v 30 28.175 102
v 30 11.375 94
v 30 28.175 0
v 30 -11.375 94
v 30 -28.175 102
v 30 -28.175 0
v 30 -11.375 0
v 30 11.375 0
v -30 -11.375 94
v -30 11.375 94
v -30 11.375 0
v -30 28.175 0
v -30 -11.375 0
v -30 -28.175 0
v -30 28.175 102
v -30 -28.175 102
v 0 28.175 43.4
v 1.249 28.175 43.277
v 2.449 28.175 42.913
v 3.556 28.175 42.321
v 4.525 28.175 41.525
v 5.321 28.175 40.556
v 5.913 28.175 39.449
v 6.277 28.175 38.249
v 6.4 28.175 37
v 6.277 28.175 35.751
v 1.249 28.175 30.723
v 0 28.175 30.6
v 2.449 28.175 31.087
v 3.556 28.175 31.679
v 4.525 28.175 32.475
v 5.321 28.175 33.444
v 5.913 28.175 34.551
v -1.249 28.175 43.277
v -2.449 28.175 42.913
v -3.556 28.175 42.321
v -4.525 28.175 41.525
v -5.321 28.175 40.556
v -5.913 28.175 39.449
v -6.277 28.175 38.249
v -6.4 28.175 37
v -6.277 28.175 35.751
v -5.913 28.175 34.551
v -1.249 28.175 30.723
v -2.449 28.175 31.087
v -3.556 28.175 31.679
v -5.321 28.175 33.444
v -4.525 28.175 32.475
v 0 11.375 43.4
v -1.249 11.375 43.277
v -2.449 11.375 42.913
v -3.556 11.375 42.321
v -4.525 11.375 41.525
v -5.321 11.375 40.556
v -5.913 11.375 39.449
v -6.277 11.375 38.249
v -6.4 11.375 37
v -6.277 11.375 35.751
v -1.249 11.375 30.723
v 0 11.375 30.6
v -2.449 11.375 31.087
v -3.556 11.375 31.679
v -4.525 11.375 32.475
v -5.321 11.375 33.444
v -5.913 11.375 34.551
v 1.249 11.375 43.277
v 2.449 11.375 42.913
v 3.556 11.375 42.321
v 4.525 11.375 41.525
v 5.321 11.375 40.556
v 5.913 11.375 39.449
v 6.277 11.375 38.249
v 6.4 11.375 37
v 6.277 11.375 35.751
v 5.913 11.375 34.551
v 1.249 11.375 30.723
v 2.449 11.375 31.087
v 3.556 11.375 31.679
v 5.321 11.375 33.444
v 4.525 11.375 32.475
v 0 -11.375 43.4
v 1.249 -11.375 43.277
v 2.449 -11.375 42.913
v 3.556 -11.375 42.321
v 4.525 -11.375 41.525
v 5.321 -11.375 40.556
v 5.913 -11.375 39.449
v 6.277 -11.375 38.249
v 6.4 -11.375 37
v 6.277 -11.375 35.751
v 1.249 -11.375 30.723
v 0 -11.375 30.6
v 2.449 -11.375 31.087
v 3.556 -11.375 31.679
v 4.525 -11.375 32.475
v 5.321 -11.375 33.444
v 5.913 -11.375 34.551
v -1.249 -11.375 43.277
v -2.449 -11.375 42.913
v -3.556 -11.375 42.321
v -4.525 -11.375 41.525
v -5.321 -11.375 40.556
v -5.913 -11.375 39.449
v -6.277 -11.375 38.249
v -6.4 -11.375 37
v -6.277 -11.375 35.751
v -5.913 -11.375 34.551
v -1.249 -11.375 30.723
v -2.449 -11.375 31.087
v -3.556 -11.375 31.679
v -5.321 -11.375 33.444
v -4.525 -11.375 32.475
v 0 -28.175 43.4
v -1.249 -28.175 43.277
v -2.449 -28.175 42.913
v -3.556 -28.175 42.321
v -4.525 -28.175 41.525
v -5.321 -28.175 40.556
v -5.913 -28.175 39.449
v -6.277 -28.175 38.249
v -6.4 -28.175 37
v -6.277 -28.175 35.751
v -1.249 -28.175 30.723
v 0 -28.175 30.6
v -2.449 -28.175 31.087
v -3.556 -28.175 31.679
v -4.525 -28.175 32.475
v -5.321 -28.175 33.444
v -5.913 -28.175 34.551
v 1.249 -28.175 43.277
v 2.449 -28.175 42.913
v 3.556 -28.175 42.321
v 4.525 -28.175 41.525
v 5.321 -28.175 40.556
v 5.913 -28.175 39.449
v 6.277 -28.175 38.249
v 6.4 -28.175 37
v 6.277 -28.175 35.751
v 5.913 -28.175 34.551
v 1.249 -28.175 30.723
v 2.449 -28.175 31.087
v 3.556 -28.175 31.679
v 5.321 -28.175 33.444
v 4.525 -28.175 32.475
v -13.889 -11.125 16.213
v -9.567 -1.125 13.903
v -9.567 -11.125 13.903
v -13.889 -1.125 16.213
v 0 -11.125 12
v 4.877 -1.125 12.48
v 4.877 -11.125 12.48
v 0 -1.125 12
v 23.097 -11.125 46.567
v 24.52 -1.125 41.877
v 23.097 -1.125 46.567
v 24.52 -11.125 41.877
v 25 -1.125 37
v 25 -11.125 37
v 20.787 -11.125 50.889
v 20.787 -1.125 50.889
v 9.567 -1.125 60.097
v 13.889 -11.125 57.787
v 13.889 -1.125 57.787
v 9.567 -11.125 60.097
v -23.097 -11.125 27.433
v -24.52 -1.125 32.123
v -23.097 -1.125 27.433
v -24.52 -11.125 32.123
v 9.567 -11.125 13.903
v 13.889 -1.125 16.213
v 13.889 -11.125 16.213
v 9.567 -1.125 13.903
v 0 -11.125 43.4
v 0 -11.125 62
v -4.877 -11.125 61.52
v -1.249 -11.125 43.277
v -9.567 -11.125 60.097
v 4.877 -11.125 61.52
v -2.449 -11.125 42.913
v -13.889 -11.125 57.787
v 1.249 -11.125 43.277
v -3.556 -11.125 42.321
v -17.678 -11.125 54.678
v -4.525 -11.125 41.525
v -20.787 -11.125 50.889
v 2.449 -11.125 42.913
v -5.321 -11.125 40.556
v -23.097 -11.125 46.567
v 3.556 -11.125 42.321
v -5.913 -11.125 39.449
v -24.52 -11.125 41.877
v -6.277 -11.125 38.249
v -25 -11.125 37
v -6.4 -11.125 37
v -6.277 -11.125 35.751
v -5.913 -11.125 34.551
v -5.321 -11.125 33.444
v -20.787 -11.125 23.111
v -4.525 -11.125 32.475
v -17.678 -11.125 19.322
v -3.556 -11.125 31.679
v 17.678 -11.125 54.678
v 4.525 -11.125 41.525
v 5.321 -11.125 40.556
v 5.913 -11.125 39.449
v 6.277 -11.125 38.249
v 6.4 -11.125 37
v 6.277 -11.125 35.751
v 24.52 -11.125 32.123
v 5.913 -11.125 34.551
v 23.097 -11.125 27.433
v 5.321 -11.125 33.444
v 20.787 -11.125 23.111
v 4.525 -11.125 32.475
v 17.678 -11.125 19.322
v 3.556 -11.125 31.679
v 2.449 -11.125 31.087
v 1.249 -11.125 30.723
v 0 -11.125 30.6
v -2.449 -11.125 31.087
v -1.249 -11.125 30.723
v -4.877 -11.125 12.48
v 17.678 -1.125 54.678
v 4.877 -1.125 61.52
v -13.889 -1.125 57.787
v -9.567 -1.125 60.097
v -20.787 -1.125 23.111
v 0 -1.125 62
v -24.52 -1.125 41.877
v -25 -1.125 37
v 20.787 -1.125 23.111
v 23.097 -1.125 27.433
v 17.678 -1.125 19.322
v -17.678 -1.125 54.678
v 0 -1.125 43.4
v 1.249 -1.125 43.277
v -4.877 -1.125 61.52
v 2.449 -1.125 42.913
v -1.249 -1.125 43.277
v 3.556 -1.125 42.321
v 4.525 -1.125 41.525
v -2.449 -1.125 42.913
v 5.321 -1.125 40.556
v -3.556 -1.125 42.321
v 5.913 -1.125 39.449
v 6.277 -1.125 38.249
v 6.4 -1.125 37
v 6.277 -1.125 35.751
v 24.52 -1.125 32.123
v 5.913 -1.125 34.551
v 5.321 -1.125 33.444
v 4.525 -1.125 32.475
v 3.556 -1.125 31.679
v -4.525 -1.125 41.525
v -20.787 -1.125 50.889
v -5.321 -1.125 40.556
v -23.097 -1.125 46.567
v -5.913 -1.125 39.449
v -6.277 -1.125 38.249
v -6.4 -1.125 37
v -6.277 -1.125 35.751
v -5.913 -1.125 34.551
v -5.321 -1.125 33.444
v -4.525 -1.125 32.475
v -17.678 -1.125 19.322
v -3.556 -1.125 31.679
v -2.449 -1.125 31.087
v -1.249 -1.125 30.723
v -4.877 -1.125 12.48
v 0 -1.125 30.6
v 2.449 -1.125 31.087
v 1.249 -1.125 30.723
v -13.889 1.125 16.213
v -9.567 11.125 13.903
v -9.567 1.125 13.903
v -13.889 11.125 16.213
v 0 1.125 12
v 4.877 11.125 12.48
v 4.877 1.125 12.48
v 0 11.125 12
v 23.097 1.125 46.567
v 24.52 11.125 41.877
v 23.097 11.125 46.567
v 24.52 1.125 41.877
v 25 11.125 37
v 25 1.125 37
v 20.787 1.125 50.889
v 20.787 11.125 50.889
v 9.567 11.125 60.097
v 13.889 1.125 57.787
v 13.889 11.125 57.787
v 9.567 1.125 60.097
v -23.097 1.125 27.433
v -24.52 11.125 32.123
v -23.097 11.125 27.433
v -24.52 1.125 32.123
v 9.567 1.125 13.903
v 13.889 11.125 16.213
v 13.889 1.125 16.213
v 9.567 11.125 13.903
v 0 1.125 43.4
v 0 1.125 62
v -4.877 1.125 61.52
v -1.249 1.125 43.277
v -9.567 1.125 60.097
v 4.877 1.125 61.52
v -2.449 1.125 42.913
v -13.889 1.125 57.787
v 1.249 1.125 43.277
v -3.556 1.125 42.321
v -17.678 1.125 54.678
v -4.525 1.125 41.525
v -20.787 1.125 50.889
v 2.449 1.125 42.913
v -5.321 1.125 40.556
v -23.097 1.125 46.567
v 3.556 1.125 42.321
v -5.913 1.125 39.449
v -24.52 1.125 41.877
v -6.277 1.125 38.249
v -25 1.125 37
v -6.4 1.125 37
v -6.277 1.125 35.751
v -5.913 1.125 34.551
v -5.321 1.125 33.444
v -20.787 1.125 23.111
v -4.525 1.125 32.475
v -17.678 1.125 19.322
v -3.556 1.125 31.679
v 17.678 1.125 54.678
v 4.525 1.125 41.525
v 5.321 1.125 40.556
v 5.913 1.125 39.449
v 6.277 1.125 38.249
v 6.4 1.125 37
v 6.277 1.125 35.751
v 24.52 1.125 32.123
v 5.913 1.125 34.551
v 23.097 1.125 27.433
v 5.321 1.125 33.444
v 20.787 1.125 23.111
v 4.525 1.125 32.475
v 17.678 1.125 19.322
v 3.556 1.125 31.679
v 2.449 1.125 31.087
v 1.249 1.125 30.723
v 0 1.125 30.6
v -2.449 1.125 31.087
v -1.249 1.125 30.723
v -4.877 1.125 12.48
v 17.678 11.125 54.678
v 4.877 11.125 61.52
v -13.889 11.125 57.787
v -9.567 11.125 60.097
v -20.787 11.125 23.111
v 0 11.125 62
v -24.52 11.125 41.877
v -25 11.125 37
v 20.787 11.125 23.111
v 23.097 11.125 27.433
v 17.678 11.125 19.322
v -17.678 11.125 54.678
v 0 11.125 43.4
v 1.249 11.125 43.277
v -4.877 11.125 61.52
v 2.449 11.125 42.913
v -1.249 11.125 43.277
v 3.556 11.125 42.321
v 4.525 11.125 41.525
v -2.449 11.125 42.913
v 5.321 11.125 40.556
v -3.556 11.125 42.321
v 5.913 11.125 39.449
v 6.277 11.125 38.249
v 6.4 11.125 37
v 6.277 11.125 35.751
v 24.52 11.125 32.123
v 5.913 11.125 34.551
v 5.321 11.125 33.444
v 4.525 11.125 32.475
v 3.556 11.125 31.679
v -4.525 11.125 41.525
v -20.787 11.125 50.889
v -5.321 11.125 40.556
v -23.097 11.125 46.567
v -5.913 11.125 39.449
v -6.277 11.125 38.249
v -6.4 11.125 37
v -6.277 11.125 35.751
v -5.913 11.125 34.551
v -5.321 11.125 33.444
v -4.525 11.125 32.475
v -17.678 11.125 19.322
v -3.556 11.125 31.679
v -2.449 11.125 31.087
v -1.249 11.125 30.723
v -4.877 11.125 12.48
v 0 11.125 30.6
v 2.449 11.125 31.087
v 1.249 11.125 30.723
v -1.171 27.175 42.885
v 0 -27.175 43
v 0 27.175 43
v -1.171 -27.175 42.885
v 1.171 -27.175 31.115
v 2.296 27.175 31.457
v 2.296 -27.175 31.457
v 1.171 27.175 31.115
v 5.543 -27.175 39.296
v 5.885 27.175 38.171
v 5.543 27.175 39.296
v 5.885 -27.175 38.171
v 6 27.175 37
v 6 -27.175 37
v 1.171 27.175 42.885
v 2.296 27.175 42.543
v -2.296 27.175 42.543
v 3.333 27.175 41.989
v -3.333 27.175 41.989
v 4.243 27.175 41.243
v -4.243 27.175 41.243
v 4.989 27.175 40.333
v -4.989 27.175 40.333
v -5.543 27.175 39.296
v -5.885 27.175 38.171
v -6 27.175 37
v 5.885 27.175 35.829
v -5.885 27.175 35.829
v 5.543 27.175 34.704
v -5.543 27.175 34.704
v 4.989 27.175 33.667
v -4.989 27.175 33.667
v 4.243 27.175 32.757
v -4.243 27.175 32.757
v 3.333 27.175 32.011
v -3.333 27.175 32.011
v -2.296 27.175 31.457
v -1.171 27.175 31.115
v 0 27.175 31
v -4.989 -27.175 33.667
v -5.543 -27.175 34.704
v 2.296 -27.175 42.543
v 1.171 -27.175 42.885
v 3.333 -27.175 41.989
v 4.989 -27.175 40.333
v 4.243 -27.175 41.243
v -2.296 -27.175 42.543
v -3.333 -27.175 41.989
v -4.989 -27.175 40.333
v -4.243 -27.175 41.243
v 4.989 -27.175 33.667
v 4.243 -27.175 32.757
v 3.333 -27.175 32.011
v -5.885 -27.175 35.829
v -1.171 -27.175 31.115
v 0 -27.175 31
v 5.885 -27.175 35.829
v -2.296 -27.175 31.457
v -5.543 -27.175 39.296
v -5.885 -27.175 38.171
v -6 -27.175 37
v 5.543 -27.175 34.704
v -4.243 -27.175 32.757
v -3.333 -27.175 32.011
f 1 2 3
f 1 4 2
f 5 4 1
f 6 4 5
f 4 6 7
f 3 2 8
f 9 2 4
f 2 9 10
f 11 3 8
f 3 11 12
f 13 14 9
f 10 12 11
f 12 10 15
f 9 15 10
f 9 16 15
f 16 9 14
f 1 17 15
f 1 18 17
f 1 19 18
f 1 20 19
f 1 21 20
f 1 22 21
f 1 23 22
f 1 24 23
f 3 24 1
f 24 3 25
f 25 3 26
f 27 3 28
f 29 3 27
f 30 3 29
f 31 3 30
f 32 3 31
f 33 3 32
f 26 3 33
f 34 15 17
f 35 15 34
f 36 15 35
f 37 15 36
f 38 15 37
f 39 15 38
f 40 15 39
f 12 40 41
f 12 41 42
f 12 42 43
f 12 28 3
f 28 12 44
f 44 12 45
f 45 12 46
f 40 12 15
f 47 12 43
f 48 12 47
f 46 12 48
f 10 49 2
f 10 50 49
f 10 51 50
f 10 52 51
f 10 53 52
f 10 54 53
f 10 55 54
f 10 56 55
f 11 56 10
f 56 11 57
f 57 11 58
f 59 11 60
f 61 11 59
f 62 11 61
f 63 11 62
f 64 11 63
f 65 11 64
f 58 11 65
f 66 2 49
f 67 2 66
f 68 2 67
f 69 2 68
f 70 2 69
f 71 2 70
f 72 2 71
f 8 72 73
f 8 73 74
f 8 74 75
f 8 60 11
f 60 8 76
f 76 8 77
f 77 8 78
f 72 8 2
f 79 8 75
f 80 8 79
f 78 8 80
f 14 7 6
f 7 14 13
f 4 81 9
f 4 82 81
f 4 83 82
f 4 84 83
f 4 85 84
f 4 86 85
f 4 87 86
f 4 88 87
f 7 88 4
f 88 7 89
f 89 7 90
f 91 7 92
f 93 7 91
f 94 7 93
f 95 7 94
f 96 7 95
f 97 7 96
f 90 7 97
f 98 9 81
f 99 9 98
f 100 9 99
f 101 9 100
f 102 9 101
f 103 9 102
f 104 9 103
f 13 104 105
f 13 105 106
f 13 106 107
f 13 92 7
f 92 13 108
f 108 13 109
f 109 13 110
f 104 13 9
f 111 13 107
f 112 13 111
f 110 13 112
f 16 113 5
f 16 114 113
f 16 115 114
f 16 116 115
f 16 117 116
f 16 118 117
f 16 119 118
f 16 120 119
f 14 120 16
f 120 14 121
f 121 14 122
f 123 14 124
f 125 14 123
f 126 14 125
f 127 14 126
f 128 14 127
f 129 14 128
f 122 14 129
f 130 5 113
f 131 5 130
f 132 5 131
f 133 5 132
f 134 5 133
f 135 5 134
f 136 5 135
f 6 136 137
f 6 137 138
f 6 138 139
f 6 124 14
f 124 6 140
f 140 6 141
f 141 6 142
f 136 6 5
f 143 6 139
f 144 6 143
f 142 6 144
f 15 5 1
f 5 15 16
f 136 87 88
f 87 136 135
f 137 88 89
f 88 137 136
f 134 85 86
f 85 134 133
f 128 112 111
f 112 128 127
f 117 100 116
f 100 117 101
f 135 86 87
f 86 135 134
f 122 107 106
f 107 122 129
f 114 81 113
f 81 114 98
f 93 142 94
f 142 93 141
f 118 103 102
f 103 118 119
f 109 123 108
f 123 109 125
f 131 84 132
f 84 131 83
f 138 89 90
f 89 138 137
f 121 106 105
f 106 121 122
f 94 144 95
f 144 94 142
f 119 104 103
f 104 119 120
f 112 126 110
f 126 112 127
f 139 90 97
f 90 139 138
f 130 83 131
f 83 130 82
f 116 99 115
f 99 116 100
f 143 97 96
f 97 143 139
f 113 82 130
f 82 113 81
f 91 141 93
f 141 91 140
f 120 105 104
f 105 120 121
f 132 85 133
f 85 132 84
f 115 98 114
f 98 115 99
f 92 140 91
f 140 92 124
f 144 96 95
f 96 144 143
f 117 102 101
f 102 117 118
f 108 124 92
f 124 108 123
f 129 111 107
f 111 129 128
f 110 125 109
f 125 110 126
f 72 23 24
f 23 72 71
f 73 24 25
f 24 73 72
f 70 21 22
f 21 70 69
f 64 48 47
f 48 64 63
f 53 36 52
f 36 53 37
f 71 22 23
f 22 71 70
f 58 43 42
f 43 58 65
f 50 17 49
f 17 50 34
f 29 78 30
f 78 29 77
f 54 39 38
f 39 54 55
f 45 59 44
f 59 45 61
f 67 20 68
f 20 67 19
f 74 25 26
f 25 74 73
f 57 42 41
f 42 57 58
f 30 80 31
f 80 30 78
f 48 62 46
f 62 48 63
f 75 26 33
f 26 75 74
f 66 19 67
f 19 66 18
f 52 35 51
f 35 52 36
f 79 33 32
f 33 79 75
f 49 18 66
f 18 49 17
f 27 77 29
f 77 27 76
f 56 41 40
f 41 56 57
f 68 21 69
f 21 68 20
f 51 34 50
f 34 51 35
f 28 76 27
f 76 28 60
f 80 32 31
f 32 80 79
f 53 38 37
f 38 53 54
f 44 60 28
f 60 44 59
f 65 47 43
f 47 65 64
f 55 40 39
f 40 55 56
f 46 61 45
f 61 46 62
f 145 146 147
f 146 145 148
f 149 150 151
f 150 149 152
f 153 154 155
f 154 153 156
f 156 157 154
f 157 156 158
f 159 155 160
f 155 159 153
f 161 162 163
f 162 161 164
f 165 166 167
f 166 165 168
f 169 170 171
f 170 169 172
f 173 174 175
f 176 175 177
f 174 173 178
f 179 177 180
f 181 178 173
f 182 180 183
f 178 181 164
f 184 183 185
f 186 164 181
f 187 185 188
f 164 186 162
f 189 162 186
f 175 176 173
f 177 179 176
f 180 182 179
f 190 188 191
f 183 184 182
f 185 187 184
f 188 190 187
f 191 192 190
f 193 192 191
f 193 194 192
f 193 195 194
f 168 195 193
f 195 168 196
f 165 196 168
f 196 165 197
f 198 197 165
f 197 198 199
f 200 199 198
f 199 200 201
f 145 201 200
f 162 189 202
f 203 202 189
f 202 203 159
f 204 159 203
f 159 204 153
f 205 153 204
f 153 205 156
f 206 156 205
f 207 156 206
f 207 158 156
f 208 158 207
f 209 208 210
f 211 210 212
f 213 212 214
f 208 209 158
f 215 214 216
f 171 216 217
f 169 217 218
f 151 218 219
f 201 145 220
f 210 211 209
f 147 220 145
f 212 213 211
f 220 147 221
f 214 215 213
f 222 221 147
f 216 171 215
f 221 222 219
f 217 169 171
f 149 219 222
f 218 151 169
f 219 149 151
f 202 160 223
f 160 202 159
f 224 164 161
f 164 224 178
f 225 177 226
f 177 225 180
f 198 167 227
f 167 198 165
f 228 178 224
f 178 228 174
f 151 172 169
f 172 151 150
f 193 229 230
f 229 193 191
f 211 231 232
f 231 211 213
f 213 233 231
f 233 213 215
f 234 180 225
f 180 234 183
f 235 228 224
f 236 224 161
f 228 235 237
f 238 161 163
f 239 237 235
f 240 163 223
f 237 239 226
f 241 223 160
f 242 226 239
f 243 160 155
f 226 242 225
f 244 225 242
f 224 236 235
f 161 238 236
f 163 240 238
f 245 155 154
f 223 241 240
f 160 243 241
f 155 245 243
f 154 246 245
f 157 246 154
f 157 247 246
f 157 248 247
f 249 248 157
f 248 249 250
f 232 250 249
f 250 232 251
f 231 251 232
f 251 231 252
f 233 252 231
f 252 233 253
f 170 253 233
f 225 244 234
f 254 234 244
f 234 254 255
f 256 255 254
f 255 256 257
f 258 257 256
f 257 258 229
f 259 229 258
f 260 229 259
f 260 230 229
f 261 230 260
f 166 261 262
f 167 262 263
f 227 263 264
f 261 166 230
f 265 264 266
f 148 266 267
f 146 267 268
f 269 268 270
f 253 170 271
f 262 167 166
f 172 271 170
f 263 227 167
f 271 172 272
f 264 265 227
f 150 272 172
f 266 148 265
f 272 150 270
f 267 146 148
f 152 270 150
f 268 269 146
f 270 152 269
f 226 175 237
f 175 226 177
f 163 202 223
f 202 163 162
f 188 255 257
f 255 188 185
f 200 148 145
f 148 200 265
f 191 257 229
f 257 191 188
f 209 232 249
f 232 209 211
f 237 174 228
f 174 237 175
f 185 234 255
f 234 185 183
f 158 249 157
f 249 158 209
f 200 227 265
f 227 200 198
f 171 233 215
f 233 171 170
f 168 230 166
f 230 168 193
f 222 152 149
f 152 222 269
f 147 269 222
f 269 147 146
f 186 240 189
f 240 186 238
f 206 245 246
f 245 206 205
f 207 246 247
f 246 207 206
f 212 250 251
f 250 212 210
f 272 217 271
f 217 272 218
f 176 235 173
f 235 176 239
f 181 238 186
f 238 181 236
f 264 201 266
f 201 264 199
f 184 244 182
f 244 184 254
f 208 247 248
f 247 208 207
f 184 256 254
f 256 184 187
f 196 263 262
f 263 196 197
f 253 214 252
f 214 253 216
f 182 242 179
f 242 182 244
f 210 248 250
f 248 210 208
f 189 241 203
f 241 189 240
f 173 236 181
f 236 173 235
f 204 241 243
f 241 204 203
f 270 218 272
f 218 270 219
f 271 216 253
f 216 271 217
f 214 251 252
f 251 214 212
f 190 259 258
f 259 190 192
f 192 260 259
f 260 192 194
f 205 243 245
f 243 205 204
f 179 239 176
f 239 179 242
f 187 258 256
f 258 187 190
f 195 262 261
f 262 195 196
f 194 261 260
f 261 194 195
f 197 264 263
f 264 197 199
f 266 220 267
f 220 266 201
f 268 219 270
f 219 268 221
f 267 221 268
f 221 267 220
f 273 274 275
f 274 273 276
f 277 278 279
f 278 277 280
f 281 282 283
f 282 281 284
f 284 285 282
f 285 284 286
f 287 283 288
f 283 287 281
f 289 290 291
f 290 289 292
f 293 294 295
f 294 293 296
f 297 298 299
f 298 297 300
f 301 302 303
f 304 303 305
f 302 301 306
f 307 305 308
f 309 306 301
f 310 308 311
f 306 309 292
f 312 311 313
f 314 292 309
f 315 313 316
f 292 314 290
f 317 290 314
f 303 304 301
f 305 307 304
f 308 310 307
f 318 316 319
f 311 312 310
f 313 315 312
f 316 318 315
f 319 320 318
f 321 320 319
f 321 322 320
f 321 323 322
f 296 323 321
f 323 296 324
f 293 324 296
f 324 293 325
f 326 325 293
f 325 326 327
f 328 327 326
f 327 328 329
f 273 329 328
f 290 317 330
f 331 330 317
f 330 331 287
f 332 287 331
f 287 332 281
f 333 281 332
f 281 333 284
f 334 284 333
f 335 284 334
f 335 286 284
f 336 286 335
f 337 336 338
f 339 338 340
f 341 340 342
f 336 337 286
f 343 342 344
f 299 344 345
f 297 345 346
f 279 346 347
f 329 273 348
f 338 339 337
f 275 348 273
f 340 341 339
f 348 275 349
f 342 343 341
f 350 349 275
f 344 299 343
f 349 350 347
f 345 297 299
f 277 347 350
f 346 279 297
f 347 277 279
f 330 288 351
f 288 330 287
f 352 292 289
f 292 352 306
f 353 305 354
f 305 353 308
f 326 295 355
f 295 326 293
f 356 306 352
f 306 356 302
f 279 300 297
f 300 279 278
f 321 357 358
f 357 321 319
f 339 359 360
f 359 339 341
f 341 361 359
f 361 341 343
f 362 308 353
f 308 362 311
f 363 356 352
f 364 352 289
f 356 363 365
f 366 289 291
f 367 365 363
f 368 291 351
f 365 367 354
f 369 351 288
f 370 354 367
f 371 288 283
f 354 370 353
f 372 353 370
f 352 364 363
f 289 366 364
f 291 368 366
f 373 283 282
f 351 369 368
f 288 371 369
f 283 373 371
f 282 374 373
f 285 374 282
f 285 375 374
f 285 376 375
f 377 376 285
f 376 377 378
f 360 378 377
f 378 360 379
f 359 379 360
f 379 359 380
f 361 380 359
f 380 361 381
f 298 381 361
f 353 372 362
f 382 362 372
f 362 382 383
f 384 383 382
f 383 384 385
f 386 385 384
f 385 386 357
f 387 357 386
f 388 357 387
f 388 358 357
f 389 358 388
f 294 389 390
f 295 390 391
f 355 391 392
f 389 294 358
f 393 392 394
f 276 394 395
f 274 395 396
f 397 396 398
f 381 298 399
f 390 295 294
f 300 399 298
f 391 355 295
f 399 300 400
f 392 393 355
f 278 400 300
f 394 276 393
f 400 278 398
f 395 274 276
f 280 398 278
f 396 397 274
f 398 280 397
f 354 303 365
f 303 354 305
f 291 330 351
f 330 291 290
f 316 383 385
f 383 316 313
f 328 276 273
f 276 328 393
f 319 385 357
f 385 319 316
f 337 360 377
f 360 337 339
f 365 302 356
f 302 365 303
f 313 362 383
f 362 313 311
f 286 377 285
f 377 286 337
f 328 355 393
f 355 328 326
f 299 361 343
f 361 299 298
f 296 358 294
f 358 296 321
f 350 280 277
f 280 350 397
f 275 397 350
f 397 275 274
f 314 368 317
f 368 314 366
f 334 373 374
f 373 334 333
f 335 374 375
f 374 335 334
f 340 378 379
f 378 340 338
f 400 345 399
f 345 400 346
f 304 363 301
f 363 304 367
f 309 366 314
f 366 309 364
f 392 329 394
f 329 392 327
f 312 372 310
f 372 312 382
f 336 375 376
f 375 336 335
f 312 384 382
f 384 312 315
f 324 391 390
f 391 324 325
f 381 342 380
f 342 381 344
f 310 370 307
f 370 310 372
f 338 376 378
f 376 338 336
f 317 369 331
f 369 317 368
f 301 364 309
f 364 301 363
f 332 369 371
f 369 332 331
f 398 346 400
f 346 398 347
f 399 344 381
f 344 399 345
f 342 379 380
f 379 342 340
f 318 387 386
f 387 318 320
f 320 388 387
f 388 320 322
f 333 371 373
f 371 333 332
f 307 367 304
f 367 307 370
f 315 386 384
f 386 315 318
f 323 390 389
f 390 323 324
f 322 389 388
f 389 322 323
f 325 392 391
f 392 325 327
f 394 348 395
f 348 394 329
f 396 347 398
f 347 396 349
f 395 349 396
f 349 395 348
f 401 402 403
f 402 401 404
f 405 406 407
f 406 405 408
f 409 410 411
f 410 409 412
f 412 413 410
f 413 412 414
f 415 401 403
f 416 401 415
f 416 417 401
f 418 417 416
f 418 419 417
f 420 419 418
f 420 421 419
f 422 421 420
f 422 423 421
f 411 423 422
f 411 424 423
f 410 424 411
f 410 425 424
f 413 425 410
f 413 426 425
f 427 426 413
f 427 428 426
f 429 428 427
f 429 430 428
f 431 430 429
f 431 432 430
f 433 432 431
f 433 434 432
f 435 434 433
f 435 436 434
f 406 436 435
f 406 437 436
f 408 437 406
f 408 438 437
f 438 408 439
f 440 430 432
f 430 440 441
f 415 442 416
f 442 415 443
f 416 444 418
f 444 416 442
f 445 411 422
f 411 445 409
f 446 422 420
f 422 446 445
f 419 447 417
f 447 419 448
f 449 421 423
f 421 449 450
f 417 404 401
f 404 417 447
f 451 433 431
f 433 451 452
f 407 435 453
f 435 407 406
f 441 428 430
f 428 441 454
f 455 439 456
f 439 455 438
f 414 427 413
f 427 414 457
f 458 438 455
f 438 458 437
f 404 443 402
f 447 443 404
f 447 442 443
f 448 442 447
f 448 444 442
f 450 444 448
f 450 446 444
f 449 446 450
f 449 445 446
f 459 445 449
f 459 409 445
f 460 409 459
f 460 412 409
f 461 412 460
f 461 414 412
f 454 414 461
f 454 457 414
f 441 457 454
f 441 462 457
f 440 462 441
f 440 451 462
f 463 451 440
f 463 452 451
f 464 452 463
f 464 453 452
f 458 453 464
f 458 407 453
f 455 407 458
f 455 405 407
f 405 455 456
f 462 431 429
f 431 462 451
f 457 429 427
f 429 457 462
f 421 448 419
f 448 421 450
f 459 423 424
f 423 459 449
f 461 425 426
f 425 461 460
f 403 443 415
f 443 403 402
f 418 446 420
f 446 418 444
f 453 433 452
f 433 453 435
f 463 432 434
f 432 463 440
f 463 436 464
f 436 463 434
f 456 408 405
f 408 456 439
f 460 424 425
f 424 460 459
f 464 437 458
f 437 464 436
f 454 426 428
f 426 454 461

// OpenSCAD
$fn = 32;

// ------------------------------------------------------------------------
// Trolley wheel set: wheels d50, fork 94 mm tall
// Every part is its own module, assembly() places every instance.
// ------------------------------------------------------------------------

// --- part 1 ---
module trolley_fork() {
  difference() {
    union() {
      translate([-30, 11.375, 0]) cube([60, 16.8, 94]);
      translate([-30, -28.175, 0]) cube([60, 16.8, 94]);
      translate([-30, -28.175, 94]) cube([60, 56.35, 8]);
    }
    translate([0, -19.775, 37]) rotate([90, 0, 0]) cylinder(h = 18.8, d = 12.8, center = true);
    translate([0, 19.775, 37]) rotate([90, 0, 0]) cylinder(h = 18.8, d = 12.8, center = true);
  }
}

// --- part 2 ---
module trolley_wheel() {
  difference() {
      translate([0, 0, 0]) cylinder(h = 10, d = 50);
      translate([0, 0, -1]) cylinder(h = 12, d = 12.8);
    }
}

// --- part 3 ---
module trolley_axle() {
  translate([0, 0, -27.175]) cylinder(h = 54.35, d = 12);
}

// --- assembly ---
module assembly() {
  color([0.80, 0.24, 0.20]) translate([0, 0, 0]) rotate([0, 0, 0]) trolley_fork();
  color([0.20, 0.45, 0.75]) translate([0, -1.125, 37]) rotate([90, 0, 0]) trolley_wheel();
  color([0.25, 0.62, 0.32]) translate([0, 11.125, 37]) rotate([90, 0, 0]) trolley_wheel();
  color([0.92, 0.70, 0.18]) translate([0, 0, 37]) rotate([90, 0, 0]) trolley_axle();
}

assembly();
